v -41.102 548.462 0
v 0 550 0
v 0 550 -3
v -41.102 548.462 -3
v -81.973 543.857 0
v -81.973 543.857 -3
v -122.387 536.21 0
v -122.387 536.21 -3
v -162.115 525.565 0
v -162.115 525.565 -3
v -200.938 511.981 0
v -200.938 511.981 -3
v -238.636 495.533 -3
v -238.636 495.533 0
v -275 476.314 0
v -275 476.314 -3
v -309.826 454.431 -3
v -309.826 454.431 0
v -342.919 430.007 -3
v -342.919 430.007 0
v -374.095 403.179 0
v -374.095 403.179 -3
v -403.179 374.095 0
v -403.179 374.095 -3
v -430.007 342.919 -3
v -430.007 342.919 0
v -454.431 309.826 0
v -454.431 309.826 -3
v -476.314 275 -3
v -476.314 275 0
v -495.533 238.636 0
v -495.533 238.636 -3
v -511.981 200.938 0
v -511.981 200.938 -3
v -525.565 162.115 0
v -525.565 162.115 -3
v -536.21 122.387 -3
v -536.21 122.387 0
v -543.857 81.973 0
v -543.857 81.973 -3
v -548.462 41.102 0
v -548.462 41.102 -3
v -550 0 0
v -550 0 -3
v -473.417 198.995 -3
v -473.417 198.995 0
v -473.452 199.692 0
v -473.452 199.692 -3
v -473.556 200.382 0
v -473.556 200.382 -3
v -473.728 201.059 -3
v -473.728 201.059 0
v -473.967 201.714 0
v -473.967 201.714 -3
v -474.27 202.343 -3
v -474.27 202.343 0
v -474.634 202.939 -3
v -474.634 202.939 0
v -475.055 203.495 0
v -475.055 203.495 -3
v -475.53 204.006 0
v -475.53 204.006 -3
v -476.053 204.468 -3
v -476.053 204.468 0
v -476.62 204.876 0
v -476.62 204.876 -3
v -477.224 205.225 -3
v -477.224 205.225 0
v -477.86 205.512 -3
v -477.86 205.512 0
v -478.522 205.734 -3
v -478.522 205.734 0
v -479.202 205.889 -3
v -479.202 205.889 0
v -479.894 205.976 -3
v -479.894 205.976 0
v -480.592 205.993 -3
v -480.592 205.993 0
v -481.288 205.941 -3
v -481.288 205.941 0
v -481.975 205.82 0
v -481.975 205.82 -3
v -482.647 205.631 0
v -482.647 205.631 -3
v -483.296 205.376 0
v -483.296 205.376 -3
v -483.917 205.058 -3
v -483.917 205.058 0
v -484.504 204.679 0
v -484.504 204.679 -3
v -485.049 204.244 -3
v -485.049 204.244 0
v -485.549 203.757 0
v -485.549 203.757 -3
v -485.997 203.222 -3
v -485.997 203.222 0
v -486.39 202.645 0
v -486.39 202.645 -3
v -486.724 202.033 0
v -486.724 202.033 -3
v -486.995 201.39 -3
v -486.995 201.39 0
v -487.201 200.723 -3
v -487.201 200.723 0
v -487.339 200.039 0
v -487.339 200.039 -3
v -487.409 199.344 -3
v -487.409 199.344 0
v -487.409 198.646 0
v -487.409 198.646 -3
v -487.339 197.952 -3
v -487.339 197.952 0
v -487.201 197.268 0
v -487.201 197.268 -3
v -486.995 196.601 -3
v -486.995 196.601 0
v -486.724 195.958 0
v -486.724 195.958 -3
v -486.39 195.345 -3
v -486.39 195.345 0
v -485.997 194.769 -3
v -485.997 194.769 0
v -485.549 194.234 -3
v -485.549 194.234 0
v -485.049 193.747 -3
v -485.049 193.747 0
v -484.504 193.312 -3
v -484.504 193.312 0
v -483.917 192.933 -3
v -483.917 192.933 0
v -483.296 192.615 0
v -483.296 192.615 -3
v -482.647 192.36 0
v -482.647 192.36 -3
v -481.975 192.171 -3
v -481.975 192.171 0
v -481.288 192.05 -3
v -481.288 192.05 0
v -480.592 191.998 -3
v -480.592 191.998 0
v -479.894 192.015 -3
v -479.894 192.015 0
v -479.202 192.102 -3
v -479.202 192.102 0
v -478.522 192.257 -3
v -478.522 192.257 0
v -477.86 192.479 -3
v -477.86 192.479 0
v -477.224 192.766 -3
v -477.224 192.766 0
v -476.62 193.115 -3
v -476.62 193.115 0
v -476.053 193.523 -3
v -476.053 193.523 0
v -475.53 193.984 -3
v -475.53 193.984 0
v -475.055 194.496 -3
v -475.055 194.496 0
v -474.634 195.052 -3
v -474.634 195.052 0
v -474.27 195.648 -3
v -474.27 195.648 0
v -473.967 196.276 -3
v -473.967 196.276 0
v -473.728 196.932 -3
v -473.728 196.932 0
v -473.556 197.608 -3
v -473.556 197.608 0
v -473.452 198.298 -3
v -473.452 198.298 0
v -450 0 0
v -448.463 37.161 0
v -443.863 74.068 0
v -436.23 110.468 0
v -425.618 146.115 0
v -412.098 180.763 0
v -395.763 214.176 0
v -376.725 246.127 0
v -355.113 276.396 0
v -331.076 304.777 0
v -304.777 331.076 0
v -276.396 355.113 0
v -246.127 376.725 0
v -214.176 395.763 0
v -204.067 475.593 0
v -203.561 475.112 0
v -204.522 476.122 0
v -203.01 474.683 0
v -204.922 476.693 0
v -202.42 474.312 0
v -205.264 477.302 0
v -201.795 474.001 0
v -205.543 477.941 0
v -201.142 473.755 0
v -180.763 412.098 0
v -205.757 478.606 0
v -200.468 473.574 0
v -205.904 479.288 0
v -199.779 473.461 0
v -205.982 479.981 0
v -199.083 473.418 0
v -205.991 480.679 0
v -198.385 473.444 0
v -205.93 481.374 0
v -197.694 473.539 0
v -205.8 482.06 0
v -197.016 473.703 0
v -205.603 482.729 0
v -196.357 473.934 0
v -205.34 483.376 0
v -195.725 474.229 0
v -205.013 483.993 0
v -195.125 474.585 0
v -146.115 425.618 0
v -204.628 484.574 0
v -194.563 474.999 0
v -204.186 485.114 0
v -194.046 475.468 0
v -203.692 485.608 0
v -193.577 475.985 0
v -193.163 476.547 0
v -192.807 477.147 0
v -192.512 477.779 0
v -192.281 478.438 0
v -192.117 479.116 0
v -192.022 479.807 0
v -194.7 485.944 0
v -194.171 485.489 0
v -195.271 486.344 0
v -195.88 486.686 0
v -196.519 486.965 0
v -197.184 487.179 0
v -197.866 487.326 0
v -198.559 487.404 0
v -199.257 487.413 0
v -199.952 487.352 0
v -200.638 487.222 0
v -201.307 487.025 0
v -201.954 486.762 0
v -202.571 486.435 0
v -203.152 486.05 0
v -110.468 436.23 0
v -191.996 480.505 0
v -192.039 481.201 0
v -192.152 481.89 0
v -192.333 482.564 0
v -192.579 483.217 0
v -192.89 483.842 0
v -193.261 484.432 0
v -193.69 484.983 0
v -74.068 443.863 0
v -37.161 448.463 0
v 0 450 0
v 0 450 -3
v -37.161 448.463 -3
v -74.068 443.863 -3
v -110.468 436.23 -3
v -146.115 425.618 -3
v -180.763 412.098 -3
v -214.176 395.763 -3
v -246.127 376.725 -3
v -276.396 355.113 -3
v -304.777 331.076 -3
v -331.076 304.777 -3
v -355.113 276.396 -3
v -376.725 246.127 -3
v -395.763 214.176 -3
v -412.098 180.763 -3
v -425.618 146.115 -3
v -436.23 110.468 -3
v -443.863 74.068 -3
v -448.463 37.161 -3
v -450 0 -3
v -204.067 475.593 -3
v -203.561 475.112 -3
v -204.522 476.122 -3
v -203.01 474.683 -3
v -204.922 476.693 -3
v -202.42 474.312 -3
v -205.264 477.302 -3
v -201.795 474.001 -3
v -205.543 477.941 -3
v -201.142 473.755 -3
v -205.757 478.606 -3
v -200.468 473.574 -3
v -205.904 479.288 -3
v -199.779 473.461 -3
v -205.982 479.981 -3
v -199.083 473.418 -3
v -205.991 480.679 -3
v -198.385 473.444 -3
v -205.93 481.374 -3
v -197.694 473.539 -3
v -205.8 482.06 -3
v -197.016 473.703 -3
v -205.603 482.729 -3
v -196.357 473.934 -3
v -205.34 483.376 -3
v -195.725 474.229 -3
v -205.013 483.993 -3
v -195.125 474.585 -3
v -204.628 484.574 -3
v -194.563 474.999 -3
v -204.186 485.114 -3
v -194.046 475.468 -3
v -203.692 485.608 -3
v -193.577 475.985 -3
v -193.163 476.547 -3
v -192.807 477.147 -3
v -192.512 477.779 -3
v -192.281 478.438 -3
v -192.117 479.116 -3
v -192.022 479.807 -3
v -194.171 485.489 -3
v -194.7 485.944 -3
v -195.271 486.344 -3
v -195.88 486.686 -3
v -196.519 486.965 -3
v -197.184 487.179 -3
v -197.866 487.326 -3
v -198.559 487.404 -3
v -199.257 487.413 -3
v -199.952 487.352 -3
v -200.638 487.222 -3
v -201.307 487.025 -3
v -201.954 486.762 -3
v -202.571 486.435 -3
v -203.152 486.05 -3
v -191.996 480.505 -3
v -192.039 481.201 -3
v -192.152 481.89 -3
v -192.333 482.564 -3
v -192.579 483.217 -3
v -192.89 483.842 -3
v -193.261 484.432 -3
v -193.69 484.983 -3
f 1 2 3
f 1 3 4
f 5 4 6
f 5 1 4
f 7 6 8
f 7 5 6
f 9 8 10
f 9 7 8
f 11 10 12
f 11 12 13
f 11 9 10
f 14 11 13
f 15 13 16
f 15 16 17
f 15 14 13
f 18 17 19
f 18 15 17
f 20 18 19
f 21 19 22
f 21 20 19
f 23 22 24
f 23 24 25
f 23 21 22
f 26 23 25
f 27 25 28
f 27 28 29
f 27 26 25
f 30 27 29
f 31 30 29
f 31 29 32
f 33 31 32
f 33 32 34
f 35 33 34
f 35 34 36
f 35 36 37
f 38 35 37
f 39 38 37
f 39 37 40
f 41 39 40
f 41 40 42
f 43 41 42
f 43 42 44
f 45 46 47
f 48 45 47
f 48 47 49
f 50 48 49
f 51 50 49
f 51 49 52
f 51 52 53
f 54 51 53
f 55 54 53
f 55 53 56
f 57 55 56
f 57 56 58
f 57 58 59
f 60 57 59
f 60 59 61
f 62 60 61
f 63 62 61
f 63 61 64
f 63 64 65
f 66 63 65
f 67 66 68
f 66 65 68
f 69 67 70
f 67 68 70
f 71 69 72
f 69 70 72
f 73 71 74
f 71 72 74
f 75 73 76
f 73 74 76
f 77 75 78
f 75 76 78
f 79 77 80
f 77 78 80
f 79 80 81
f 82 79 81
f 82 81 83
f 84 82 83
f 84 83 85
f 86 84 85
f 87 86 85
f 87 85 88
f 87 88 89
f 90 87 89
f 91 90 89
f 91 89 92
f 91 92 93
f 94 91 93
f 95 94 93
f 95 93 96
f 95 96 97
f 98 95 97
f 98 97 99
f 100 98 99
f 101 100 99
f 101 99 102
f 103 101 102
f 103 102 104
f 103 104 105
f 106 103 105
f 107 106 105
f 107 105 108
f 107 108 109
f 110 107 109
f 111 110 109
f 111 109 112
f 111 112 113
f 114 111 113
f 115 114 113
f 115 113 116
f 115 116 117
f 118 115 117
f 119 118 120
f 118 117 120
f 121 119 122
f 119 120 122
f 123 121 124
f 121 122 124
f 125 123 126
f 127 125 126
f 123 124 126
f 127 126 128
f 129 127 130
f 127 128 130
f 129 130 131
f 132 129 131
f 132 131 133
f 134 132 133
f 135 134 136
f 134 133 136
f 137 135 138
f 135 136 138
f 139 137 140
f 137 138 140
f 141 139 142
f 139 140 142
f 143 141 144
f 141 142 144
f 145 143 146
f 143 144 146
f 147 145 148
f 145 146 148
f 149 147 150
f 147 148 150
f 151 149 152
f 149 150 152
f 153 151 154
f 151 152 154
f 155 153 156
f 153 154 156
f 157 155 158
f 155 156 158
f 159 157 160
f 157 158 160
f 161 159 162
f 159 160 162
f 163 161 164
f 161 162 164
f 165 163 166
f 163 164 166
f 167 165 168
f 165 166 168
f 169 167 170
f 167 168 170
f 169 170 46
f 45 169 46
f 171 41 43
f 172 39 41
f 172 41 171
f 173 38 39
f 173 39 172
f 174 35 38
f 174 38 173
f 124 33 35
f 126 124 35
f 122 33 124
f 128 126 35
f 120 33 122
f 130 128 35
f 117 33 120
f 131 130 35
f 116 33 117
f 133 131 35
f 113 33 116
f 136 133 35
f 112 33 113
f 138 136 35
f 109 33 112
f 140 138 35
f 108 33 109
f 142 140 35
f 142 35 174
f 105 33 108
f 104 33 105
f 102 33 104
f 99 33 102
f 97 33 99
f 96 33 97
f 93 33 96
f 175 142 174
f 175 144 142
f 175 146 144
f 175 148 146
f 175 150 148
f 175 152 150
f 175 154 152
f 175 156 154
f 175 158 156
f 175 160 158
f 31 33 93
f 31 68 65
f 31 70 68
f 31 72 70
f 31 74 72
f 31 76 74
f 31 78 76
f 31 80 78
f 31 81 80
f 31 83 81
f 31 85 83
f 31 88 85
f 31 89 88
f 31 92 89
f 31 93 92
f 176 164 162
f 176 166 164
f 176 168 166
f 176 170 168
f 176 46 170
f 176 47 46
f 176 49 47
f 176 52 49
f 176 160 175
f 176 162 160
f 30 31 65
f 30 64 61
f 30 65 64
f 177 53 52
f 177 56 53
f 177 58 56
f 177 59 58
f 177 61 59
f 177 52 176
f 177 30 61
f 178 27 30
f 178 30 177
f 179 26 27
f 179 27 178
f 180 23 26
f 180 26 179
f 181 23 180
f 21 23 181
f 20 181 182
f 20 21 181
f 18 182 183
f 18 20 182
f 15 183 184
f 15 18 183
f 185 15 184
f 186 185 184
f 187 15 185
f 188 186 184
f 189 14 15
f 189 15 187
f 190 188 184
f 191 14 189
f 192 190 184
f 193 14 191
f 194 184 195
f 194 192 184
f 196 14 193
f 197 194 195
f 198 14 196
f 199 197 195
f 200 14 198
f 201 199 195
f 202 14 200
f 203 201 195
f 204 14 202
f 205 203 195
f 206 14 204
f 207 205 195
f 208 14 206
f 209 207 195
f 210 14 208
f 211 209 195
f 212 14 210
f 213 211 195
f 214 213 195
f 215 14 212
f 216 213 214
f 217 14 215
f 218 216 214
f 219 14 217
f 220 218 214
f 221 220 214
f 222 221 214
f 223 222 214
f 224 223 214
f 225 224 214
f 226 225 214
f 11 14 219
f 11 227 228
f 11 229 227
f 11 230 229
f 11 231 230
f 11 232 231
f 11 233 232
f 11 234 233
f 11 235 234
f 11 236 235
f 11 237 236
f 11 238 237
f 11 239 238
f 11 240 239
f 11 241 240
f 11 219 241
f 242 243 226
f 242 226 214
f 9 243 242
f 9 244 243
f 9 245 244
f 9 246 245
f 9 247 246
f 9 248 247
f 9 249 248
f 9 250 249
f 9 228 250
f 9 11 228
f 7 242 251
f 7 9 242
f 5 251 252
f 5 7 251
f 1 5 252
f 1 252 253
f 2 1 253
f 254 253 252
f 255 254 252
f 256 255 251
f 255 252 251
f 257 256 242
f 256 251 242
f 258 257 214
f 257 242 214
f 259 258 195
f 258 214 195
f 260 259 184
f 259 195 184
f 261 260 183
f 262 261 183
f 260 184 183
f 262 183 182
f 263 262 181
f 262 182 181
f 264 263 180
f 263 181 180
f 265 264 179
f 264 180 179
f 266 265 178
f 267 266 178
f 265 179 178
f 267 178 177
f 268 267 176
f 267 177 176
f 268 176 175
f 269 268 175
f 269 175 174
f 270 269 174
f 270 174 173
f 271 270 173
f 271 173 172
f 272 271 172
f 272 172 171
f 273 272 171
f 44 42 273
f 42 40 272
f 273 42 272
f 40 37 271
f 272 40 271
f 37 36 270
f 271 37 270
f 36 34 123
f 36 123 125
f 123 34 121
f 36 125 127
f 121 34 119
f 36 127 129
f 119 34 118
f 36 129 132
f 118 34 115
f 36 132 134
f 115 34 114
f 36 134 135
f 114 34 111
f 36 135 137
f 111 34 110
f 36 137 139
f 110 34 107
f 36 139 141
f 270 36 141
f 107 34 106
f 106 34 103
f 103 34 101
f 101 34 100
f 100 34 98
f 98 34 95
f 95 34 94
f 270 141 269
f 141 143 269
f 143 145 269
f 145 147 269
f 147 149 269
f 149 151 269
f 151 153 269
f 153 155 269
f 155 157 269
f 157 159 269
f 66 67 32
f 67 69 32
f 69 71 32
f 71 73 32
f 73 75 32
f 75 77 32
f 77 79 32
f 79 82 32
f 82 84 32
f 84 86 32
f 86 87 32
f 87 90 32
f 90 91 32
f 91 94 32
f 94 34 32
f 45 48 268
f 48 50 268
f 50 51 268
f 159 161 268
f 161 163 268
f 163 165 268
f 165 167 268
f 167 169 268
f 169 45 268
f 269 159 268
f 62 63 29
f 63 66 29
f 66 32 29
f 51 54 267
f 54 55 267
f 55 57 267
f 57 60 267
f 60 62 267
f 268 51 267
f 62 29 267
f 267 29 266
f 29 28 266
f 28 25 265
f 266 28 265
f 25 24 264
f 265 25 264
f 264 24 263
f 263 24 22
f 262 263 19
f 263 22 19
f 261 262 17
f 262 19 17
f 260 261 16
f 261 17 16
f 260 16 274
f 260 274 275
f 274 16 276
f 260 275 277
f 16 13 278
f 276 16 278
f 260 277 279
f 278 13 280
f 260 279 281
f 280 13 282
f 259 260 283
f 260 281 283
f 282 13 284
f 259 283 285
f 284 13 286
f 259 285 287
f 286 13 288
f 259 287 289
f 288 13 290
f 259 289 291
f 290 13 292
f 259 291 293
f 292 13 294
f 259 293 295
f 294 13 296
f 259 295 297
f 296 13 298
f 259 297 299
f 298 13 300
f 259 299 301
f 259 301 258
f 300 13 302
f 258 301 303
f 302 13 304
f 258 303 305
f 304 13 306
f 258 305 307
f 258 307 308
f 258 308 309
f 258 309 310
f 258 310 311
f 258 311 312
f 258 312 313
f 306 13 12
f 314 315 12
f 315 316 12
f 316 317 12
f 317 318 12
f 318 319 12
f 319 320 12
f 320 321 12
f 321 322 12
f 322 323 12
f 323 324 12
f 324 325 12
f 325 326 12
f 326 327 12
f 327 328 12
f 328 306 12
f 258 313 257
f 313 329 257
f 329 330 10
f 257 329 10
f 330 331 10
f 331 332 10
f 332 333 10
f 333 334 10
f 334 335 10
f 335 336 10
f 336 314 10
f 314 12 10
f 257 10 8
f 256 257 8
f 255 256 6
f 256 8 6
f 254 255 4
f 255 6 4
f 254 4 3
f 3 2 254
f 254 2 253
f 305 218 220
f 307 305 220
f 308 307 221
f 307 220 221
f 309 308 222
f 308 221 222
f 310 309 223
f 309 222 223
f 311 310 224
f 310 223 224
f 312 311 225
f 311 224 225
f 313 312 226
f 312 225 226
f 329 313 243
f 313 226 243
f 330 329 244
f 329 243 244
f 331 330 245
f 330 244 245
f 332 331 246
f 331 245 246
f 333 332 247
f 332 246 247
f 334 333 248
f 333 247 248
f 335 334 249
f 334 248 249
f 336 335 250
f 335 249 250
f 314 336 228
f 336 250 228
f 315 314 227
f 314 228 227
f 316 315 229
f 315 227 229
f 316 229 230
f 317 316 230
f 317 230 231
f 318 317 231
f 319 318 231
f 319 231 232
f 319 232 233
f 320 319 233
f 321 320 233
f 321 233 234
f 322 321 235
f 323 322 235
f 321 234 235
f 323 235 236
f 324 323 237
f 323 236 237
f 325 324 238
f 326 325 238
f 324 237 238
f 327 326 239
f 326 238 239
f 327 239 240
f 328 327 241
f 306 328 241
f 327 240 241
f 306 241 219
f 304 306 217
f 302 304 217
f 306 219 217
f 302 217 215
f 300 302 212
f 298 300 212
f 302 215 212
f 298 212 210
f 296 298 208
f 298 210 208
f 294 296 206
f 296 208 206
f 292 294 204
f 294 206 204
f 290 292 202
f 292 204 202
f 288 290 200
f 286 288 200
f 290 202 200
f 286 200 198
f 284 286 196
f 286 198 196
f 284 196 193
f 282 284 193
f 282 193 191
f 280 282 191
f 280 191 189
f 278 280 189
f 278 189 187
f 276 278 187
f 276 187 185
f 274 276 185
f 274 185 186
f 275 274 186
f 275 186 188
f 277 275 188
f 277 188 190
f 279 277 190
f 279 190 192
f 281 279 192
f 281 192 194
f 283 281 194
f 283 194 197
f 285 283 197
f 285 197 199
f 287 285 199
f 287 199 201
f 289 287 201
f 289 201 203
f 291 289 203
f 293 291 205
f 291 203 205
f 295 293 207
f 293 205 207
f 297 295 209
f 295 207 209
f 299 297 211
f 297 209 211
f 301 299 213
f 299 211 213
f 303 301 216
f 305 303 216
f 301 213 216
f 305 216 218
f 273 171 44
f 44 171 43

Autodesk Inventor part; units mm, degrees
ref_plane "YZ Plane" through (0, 0, 0) normal (1, 0, 0) x (0, 1, 0)
ref_plane "XZ Plane" through (0, 0, 0) normal (0, 1, 0) x (-1, 0, 0)
ref_plane "XY Plane" through (0, 0, 0) normal (0, 0, 1) x (1, 0, 0)
sketch "Sketch1" plane through (0, 0, 0) normal (0, 0, 1) x (1, 0, 0)
  arc A0 (0, 550) -> (-550, 0) centre (0, 0) ccw
  arc A1 (0, 450) -> (-450, 0) centre (0, 0) ccw
  line L0 (0, 550) -> (0, 450)
  line L1 (-450, 0) -> (-550, 0)
  point P0 (-500, 0)
  point P1 (0, 500)
  dimension "d0" = 1100
  dimension "d1" = 900
extrude "Plate1" add sketch "Sketch1" against normal blind 3
sketch "Sketch2" plane through (0, 0, 0) normal (0, 0, 1) x (1, 0, 0)
  line L0 (-550, 0) -> (-450, 0) projected
  arc A0 (0, 550) -> (-550, 0) centre (0, 0) ccw construction
  circle A1 centre (-480.4174, 198.9954) radius 7
  arc A2 (0, 450) -> (-450, 0) centre (0, 0) ccw construction
  circle A3 centre (0, 0) radius 520 construction
  line L1 (-480.4174, 198.9954) -> (0, 0) construction
  dimension "d11" = 1040
  dimension "d4" = 14
  dimension "d12" = 22.5
extrude "Cut1" cut sketch "Sketch2" against normal through all
pattern_circular "Circular Pattern1" count 2 over 45 about axis through (0, 0, 0) along (0, 0, -1) of "Cut1"
equation "\"d0\" = Диаметр_вн"
equation "\"d1\" = d0 - 2 * Ширина_кольца"
equation "\"d4\" = Диаметр_отв"
equation "\"d6\" = Thickness"
equation "\"d2\" = Thickness"
equation "\"BendReliefWidth\" = Thickness"
equation "\"BendReliefDepth\" = 0.5 * Thickness"
equation "\"CornerReliefSize\" = 4 * Thickness"
equation "\"MinimumRemnant\" = 2 * Thickness"
equation "\"TransitionRadius\" = BendRadius"
equation "\"JacobiRadiusSize\" = BendRadius"
equation "\"GapSize\" = Thickness"
equation "\"Диаметр_вн\" = 1100"
equation "\"Ширина_кольца\" = 100"
equation "\"Диаметр_отв\" = 14"
equation "\"Thickness\" = 3"
equation "\"BendRadius\" = 5"
properties part number "BSH 501 segment" material "Stainless Steel"
